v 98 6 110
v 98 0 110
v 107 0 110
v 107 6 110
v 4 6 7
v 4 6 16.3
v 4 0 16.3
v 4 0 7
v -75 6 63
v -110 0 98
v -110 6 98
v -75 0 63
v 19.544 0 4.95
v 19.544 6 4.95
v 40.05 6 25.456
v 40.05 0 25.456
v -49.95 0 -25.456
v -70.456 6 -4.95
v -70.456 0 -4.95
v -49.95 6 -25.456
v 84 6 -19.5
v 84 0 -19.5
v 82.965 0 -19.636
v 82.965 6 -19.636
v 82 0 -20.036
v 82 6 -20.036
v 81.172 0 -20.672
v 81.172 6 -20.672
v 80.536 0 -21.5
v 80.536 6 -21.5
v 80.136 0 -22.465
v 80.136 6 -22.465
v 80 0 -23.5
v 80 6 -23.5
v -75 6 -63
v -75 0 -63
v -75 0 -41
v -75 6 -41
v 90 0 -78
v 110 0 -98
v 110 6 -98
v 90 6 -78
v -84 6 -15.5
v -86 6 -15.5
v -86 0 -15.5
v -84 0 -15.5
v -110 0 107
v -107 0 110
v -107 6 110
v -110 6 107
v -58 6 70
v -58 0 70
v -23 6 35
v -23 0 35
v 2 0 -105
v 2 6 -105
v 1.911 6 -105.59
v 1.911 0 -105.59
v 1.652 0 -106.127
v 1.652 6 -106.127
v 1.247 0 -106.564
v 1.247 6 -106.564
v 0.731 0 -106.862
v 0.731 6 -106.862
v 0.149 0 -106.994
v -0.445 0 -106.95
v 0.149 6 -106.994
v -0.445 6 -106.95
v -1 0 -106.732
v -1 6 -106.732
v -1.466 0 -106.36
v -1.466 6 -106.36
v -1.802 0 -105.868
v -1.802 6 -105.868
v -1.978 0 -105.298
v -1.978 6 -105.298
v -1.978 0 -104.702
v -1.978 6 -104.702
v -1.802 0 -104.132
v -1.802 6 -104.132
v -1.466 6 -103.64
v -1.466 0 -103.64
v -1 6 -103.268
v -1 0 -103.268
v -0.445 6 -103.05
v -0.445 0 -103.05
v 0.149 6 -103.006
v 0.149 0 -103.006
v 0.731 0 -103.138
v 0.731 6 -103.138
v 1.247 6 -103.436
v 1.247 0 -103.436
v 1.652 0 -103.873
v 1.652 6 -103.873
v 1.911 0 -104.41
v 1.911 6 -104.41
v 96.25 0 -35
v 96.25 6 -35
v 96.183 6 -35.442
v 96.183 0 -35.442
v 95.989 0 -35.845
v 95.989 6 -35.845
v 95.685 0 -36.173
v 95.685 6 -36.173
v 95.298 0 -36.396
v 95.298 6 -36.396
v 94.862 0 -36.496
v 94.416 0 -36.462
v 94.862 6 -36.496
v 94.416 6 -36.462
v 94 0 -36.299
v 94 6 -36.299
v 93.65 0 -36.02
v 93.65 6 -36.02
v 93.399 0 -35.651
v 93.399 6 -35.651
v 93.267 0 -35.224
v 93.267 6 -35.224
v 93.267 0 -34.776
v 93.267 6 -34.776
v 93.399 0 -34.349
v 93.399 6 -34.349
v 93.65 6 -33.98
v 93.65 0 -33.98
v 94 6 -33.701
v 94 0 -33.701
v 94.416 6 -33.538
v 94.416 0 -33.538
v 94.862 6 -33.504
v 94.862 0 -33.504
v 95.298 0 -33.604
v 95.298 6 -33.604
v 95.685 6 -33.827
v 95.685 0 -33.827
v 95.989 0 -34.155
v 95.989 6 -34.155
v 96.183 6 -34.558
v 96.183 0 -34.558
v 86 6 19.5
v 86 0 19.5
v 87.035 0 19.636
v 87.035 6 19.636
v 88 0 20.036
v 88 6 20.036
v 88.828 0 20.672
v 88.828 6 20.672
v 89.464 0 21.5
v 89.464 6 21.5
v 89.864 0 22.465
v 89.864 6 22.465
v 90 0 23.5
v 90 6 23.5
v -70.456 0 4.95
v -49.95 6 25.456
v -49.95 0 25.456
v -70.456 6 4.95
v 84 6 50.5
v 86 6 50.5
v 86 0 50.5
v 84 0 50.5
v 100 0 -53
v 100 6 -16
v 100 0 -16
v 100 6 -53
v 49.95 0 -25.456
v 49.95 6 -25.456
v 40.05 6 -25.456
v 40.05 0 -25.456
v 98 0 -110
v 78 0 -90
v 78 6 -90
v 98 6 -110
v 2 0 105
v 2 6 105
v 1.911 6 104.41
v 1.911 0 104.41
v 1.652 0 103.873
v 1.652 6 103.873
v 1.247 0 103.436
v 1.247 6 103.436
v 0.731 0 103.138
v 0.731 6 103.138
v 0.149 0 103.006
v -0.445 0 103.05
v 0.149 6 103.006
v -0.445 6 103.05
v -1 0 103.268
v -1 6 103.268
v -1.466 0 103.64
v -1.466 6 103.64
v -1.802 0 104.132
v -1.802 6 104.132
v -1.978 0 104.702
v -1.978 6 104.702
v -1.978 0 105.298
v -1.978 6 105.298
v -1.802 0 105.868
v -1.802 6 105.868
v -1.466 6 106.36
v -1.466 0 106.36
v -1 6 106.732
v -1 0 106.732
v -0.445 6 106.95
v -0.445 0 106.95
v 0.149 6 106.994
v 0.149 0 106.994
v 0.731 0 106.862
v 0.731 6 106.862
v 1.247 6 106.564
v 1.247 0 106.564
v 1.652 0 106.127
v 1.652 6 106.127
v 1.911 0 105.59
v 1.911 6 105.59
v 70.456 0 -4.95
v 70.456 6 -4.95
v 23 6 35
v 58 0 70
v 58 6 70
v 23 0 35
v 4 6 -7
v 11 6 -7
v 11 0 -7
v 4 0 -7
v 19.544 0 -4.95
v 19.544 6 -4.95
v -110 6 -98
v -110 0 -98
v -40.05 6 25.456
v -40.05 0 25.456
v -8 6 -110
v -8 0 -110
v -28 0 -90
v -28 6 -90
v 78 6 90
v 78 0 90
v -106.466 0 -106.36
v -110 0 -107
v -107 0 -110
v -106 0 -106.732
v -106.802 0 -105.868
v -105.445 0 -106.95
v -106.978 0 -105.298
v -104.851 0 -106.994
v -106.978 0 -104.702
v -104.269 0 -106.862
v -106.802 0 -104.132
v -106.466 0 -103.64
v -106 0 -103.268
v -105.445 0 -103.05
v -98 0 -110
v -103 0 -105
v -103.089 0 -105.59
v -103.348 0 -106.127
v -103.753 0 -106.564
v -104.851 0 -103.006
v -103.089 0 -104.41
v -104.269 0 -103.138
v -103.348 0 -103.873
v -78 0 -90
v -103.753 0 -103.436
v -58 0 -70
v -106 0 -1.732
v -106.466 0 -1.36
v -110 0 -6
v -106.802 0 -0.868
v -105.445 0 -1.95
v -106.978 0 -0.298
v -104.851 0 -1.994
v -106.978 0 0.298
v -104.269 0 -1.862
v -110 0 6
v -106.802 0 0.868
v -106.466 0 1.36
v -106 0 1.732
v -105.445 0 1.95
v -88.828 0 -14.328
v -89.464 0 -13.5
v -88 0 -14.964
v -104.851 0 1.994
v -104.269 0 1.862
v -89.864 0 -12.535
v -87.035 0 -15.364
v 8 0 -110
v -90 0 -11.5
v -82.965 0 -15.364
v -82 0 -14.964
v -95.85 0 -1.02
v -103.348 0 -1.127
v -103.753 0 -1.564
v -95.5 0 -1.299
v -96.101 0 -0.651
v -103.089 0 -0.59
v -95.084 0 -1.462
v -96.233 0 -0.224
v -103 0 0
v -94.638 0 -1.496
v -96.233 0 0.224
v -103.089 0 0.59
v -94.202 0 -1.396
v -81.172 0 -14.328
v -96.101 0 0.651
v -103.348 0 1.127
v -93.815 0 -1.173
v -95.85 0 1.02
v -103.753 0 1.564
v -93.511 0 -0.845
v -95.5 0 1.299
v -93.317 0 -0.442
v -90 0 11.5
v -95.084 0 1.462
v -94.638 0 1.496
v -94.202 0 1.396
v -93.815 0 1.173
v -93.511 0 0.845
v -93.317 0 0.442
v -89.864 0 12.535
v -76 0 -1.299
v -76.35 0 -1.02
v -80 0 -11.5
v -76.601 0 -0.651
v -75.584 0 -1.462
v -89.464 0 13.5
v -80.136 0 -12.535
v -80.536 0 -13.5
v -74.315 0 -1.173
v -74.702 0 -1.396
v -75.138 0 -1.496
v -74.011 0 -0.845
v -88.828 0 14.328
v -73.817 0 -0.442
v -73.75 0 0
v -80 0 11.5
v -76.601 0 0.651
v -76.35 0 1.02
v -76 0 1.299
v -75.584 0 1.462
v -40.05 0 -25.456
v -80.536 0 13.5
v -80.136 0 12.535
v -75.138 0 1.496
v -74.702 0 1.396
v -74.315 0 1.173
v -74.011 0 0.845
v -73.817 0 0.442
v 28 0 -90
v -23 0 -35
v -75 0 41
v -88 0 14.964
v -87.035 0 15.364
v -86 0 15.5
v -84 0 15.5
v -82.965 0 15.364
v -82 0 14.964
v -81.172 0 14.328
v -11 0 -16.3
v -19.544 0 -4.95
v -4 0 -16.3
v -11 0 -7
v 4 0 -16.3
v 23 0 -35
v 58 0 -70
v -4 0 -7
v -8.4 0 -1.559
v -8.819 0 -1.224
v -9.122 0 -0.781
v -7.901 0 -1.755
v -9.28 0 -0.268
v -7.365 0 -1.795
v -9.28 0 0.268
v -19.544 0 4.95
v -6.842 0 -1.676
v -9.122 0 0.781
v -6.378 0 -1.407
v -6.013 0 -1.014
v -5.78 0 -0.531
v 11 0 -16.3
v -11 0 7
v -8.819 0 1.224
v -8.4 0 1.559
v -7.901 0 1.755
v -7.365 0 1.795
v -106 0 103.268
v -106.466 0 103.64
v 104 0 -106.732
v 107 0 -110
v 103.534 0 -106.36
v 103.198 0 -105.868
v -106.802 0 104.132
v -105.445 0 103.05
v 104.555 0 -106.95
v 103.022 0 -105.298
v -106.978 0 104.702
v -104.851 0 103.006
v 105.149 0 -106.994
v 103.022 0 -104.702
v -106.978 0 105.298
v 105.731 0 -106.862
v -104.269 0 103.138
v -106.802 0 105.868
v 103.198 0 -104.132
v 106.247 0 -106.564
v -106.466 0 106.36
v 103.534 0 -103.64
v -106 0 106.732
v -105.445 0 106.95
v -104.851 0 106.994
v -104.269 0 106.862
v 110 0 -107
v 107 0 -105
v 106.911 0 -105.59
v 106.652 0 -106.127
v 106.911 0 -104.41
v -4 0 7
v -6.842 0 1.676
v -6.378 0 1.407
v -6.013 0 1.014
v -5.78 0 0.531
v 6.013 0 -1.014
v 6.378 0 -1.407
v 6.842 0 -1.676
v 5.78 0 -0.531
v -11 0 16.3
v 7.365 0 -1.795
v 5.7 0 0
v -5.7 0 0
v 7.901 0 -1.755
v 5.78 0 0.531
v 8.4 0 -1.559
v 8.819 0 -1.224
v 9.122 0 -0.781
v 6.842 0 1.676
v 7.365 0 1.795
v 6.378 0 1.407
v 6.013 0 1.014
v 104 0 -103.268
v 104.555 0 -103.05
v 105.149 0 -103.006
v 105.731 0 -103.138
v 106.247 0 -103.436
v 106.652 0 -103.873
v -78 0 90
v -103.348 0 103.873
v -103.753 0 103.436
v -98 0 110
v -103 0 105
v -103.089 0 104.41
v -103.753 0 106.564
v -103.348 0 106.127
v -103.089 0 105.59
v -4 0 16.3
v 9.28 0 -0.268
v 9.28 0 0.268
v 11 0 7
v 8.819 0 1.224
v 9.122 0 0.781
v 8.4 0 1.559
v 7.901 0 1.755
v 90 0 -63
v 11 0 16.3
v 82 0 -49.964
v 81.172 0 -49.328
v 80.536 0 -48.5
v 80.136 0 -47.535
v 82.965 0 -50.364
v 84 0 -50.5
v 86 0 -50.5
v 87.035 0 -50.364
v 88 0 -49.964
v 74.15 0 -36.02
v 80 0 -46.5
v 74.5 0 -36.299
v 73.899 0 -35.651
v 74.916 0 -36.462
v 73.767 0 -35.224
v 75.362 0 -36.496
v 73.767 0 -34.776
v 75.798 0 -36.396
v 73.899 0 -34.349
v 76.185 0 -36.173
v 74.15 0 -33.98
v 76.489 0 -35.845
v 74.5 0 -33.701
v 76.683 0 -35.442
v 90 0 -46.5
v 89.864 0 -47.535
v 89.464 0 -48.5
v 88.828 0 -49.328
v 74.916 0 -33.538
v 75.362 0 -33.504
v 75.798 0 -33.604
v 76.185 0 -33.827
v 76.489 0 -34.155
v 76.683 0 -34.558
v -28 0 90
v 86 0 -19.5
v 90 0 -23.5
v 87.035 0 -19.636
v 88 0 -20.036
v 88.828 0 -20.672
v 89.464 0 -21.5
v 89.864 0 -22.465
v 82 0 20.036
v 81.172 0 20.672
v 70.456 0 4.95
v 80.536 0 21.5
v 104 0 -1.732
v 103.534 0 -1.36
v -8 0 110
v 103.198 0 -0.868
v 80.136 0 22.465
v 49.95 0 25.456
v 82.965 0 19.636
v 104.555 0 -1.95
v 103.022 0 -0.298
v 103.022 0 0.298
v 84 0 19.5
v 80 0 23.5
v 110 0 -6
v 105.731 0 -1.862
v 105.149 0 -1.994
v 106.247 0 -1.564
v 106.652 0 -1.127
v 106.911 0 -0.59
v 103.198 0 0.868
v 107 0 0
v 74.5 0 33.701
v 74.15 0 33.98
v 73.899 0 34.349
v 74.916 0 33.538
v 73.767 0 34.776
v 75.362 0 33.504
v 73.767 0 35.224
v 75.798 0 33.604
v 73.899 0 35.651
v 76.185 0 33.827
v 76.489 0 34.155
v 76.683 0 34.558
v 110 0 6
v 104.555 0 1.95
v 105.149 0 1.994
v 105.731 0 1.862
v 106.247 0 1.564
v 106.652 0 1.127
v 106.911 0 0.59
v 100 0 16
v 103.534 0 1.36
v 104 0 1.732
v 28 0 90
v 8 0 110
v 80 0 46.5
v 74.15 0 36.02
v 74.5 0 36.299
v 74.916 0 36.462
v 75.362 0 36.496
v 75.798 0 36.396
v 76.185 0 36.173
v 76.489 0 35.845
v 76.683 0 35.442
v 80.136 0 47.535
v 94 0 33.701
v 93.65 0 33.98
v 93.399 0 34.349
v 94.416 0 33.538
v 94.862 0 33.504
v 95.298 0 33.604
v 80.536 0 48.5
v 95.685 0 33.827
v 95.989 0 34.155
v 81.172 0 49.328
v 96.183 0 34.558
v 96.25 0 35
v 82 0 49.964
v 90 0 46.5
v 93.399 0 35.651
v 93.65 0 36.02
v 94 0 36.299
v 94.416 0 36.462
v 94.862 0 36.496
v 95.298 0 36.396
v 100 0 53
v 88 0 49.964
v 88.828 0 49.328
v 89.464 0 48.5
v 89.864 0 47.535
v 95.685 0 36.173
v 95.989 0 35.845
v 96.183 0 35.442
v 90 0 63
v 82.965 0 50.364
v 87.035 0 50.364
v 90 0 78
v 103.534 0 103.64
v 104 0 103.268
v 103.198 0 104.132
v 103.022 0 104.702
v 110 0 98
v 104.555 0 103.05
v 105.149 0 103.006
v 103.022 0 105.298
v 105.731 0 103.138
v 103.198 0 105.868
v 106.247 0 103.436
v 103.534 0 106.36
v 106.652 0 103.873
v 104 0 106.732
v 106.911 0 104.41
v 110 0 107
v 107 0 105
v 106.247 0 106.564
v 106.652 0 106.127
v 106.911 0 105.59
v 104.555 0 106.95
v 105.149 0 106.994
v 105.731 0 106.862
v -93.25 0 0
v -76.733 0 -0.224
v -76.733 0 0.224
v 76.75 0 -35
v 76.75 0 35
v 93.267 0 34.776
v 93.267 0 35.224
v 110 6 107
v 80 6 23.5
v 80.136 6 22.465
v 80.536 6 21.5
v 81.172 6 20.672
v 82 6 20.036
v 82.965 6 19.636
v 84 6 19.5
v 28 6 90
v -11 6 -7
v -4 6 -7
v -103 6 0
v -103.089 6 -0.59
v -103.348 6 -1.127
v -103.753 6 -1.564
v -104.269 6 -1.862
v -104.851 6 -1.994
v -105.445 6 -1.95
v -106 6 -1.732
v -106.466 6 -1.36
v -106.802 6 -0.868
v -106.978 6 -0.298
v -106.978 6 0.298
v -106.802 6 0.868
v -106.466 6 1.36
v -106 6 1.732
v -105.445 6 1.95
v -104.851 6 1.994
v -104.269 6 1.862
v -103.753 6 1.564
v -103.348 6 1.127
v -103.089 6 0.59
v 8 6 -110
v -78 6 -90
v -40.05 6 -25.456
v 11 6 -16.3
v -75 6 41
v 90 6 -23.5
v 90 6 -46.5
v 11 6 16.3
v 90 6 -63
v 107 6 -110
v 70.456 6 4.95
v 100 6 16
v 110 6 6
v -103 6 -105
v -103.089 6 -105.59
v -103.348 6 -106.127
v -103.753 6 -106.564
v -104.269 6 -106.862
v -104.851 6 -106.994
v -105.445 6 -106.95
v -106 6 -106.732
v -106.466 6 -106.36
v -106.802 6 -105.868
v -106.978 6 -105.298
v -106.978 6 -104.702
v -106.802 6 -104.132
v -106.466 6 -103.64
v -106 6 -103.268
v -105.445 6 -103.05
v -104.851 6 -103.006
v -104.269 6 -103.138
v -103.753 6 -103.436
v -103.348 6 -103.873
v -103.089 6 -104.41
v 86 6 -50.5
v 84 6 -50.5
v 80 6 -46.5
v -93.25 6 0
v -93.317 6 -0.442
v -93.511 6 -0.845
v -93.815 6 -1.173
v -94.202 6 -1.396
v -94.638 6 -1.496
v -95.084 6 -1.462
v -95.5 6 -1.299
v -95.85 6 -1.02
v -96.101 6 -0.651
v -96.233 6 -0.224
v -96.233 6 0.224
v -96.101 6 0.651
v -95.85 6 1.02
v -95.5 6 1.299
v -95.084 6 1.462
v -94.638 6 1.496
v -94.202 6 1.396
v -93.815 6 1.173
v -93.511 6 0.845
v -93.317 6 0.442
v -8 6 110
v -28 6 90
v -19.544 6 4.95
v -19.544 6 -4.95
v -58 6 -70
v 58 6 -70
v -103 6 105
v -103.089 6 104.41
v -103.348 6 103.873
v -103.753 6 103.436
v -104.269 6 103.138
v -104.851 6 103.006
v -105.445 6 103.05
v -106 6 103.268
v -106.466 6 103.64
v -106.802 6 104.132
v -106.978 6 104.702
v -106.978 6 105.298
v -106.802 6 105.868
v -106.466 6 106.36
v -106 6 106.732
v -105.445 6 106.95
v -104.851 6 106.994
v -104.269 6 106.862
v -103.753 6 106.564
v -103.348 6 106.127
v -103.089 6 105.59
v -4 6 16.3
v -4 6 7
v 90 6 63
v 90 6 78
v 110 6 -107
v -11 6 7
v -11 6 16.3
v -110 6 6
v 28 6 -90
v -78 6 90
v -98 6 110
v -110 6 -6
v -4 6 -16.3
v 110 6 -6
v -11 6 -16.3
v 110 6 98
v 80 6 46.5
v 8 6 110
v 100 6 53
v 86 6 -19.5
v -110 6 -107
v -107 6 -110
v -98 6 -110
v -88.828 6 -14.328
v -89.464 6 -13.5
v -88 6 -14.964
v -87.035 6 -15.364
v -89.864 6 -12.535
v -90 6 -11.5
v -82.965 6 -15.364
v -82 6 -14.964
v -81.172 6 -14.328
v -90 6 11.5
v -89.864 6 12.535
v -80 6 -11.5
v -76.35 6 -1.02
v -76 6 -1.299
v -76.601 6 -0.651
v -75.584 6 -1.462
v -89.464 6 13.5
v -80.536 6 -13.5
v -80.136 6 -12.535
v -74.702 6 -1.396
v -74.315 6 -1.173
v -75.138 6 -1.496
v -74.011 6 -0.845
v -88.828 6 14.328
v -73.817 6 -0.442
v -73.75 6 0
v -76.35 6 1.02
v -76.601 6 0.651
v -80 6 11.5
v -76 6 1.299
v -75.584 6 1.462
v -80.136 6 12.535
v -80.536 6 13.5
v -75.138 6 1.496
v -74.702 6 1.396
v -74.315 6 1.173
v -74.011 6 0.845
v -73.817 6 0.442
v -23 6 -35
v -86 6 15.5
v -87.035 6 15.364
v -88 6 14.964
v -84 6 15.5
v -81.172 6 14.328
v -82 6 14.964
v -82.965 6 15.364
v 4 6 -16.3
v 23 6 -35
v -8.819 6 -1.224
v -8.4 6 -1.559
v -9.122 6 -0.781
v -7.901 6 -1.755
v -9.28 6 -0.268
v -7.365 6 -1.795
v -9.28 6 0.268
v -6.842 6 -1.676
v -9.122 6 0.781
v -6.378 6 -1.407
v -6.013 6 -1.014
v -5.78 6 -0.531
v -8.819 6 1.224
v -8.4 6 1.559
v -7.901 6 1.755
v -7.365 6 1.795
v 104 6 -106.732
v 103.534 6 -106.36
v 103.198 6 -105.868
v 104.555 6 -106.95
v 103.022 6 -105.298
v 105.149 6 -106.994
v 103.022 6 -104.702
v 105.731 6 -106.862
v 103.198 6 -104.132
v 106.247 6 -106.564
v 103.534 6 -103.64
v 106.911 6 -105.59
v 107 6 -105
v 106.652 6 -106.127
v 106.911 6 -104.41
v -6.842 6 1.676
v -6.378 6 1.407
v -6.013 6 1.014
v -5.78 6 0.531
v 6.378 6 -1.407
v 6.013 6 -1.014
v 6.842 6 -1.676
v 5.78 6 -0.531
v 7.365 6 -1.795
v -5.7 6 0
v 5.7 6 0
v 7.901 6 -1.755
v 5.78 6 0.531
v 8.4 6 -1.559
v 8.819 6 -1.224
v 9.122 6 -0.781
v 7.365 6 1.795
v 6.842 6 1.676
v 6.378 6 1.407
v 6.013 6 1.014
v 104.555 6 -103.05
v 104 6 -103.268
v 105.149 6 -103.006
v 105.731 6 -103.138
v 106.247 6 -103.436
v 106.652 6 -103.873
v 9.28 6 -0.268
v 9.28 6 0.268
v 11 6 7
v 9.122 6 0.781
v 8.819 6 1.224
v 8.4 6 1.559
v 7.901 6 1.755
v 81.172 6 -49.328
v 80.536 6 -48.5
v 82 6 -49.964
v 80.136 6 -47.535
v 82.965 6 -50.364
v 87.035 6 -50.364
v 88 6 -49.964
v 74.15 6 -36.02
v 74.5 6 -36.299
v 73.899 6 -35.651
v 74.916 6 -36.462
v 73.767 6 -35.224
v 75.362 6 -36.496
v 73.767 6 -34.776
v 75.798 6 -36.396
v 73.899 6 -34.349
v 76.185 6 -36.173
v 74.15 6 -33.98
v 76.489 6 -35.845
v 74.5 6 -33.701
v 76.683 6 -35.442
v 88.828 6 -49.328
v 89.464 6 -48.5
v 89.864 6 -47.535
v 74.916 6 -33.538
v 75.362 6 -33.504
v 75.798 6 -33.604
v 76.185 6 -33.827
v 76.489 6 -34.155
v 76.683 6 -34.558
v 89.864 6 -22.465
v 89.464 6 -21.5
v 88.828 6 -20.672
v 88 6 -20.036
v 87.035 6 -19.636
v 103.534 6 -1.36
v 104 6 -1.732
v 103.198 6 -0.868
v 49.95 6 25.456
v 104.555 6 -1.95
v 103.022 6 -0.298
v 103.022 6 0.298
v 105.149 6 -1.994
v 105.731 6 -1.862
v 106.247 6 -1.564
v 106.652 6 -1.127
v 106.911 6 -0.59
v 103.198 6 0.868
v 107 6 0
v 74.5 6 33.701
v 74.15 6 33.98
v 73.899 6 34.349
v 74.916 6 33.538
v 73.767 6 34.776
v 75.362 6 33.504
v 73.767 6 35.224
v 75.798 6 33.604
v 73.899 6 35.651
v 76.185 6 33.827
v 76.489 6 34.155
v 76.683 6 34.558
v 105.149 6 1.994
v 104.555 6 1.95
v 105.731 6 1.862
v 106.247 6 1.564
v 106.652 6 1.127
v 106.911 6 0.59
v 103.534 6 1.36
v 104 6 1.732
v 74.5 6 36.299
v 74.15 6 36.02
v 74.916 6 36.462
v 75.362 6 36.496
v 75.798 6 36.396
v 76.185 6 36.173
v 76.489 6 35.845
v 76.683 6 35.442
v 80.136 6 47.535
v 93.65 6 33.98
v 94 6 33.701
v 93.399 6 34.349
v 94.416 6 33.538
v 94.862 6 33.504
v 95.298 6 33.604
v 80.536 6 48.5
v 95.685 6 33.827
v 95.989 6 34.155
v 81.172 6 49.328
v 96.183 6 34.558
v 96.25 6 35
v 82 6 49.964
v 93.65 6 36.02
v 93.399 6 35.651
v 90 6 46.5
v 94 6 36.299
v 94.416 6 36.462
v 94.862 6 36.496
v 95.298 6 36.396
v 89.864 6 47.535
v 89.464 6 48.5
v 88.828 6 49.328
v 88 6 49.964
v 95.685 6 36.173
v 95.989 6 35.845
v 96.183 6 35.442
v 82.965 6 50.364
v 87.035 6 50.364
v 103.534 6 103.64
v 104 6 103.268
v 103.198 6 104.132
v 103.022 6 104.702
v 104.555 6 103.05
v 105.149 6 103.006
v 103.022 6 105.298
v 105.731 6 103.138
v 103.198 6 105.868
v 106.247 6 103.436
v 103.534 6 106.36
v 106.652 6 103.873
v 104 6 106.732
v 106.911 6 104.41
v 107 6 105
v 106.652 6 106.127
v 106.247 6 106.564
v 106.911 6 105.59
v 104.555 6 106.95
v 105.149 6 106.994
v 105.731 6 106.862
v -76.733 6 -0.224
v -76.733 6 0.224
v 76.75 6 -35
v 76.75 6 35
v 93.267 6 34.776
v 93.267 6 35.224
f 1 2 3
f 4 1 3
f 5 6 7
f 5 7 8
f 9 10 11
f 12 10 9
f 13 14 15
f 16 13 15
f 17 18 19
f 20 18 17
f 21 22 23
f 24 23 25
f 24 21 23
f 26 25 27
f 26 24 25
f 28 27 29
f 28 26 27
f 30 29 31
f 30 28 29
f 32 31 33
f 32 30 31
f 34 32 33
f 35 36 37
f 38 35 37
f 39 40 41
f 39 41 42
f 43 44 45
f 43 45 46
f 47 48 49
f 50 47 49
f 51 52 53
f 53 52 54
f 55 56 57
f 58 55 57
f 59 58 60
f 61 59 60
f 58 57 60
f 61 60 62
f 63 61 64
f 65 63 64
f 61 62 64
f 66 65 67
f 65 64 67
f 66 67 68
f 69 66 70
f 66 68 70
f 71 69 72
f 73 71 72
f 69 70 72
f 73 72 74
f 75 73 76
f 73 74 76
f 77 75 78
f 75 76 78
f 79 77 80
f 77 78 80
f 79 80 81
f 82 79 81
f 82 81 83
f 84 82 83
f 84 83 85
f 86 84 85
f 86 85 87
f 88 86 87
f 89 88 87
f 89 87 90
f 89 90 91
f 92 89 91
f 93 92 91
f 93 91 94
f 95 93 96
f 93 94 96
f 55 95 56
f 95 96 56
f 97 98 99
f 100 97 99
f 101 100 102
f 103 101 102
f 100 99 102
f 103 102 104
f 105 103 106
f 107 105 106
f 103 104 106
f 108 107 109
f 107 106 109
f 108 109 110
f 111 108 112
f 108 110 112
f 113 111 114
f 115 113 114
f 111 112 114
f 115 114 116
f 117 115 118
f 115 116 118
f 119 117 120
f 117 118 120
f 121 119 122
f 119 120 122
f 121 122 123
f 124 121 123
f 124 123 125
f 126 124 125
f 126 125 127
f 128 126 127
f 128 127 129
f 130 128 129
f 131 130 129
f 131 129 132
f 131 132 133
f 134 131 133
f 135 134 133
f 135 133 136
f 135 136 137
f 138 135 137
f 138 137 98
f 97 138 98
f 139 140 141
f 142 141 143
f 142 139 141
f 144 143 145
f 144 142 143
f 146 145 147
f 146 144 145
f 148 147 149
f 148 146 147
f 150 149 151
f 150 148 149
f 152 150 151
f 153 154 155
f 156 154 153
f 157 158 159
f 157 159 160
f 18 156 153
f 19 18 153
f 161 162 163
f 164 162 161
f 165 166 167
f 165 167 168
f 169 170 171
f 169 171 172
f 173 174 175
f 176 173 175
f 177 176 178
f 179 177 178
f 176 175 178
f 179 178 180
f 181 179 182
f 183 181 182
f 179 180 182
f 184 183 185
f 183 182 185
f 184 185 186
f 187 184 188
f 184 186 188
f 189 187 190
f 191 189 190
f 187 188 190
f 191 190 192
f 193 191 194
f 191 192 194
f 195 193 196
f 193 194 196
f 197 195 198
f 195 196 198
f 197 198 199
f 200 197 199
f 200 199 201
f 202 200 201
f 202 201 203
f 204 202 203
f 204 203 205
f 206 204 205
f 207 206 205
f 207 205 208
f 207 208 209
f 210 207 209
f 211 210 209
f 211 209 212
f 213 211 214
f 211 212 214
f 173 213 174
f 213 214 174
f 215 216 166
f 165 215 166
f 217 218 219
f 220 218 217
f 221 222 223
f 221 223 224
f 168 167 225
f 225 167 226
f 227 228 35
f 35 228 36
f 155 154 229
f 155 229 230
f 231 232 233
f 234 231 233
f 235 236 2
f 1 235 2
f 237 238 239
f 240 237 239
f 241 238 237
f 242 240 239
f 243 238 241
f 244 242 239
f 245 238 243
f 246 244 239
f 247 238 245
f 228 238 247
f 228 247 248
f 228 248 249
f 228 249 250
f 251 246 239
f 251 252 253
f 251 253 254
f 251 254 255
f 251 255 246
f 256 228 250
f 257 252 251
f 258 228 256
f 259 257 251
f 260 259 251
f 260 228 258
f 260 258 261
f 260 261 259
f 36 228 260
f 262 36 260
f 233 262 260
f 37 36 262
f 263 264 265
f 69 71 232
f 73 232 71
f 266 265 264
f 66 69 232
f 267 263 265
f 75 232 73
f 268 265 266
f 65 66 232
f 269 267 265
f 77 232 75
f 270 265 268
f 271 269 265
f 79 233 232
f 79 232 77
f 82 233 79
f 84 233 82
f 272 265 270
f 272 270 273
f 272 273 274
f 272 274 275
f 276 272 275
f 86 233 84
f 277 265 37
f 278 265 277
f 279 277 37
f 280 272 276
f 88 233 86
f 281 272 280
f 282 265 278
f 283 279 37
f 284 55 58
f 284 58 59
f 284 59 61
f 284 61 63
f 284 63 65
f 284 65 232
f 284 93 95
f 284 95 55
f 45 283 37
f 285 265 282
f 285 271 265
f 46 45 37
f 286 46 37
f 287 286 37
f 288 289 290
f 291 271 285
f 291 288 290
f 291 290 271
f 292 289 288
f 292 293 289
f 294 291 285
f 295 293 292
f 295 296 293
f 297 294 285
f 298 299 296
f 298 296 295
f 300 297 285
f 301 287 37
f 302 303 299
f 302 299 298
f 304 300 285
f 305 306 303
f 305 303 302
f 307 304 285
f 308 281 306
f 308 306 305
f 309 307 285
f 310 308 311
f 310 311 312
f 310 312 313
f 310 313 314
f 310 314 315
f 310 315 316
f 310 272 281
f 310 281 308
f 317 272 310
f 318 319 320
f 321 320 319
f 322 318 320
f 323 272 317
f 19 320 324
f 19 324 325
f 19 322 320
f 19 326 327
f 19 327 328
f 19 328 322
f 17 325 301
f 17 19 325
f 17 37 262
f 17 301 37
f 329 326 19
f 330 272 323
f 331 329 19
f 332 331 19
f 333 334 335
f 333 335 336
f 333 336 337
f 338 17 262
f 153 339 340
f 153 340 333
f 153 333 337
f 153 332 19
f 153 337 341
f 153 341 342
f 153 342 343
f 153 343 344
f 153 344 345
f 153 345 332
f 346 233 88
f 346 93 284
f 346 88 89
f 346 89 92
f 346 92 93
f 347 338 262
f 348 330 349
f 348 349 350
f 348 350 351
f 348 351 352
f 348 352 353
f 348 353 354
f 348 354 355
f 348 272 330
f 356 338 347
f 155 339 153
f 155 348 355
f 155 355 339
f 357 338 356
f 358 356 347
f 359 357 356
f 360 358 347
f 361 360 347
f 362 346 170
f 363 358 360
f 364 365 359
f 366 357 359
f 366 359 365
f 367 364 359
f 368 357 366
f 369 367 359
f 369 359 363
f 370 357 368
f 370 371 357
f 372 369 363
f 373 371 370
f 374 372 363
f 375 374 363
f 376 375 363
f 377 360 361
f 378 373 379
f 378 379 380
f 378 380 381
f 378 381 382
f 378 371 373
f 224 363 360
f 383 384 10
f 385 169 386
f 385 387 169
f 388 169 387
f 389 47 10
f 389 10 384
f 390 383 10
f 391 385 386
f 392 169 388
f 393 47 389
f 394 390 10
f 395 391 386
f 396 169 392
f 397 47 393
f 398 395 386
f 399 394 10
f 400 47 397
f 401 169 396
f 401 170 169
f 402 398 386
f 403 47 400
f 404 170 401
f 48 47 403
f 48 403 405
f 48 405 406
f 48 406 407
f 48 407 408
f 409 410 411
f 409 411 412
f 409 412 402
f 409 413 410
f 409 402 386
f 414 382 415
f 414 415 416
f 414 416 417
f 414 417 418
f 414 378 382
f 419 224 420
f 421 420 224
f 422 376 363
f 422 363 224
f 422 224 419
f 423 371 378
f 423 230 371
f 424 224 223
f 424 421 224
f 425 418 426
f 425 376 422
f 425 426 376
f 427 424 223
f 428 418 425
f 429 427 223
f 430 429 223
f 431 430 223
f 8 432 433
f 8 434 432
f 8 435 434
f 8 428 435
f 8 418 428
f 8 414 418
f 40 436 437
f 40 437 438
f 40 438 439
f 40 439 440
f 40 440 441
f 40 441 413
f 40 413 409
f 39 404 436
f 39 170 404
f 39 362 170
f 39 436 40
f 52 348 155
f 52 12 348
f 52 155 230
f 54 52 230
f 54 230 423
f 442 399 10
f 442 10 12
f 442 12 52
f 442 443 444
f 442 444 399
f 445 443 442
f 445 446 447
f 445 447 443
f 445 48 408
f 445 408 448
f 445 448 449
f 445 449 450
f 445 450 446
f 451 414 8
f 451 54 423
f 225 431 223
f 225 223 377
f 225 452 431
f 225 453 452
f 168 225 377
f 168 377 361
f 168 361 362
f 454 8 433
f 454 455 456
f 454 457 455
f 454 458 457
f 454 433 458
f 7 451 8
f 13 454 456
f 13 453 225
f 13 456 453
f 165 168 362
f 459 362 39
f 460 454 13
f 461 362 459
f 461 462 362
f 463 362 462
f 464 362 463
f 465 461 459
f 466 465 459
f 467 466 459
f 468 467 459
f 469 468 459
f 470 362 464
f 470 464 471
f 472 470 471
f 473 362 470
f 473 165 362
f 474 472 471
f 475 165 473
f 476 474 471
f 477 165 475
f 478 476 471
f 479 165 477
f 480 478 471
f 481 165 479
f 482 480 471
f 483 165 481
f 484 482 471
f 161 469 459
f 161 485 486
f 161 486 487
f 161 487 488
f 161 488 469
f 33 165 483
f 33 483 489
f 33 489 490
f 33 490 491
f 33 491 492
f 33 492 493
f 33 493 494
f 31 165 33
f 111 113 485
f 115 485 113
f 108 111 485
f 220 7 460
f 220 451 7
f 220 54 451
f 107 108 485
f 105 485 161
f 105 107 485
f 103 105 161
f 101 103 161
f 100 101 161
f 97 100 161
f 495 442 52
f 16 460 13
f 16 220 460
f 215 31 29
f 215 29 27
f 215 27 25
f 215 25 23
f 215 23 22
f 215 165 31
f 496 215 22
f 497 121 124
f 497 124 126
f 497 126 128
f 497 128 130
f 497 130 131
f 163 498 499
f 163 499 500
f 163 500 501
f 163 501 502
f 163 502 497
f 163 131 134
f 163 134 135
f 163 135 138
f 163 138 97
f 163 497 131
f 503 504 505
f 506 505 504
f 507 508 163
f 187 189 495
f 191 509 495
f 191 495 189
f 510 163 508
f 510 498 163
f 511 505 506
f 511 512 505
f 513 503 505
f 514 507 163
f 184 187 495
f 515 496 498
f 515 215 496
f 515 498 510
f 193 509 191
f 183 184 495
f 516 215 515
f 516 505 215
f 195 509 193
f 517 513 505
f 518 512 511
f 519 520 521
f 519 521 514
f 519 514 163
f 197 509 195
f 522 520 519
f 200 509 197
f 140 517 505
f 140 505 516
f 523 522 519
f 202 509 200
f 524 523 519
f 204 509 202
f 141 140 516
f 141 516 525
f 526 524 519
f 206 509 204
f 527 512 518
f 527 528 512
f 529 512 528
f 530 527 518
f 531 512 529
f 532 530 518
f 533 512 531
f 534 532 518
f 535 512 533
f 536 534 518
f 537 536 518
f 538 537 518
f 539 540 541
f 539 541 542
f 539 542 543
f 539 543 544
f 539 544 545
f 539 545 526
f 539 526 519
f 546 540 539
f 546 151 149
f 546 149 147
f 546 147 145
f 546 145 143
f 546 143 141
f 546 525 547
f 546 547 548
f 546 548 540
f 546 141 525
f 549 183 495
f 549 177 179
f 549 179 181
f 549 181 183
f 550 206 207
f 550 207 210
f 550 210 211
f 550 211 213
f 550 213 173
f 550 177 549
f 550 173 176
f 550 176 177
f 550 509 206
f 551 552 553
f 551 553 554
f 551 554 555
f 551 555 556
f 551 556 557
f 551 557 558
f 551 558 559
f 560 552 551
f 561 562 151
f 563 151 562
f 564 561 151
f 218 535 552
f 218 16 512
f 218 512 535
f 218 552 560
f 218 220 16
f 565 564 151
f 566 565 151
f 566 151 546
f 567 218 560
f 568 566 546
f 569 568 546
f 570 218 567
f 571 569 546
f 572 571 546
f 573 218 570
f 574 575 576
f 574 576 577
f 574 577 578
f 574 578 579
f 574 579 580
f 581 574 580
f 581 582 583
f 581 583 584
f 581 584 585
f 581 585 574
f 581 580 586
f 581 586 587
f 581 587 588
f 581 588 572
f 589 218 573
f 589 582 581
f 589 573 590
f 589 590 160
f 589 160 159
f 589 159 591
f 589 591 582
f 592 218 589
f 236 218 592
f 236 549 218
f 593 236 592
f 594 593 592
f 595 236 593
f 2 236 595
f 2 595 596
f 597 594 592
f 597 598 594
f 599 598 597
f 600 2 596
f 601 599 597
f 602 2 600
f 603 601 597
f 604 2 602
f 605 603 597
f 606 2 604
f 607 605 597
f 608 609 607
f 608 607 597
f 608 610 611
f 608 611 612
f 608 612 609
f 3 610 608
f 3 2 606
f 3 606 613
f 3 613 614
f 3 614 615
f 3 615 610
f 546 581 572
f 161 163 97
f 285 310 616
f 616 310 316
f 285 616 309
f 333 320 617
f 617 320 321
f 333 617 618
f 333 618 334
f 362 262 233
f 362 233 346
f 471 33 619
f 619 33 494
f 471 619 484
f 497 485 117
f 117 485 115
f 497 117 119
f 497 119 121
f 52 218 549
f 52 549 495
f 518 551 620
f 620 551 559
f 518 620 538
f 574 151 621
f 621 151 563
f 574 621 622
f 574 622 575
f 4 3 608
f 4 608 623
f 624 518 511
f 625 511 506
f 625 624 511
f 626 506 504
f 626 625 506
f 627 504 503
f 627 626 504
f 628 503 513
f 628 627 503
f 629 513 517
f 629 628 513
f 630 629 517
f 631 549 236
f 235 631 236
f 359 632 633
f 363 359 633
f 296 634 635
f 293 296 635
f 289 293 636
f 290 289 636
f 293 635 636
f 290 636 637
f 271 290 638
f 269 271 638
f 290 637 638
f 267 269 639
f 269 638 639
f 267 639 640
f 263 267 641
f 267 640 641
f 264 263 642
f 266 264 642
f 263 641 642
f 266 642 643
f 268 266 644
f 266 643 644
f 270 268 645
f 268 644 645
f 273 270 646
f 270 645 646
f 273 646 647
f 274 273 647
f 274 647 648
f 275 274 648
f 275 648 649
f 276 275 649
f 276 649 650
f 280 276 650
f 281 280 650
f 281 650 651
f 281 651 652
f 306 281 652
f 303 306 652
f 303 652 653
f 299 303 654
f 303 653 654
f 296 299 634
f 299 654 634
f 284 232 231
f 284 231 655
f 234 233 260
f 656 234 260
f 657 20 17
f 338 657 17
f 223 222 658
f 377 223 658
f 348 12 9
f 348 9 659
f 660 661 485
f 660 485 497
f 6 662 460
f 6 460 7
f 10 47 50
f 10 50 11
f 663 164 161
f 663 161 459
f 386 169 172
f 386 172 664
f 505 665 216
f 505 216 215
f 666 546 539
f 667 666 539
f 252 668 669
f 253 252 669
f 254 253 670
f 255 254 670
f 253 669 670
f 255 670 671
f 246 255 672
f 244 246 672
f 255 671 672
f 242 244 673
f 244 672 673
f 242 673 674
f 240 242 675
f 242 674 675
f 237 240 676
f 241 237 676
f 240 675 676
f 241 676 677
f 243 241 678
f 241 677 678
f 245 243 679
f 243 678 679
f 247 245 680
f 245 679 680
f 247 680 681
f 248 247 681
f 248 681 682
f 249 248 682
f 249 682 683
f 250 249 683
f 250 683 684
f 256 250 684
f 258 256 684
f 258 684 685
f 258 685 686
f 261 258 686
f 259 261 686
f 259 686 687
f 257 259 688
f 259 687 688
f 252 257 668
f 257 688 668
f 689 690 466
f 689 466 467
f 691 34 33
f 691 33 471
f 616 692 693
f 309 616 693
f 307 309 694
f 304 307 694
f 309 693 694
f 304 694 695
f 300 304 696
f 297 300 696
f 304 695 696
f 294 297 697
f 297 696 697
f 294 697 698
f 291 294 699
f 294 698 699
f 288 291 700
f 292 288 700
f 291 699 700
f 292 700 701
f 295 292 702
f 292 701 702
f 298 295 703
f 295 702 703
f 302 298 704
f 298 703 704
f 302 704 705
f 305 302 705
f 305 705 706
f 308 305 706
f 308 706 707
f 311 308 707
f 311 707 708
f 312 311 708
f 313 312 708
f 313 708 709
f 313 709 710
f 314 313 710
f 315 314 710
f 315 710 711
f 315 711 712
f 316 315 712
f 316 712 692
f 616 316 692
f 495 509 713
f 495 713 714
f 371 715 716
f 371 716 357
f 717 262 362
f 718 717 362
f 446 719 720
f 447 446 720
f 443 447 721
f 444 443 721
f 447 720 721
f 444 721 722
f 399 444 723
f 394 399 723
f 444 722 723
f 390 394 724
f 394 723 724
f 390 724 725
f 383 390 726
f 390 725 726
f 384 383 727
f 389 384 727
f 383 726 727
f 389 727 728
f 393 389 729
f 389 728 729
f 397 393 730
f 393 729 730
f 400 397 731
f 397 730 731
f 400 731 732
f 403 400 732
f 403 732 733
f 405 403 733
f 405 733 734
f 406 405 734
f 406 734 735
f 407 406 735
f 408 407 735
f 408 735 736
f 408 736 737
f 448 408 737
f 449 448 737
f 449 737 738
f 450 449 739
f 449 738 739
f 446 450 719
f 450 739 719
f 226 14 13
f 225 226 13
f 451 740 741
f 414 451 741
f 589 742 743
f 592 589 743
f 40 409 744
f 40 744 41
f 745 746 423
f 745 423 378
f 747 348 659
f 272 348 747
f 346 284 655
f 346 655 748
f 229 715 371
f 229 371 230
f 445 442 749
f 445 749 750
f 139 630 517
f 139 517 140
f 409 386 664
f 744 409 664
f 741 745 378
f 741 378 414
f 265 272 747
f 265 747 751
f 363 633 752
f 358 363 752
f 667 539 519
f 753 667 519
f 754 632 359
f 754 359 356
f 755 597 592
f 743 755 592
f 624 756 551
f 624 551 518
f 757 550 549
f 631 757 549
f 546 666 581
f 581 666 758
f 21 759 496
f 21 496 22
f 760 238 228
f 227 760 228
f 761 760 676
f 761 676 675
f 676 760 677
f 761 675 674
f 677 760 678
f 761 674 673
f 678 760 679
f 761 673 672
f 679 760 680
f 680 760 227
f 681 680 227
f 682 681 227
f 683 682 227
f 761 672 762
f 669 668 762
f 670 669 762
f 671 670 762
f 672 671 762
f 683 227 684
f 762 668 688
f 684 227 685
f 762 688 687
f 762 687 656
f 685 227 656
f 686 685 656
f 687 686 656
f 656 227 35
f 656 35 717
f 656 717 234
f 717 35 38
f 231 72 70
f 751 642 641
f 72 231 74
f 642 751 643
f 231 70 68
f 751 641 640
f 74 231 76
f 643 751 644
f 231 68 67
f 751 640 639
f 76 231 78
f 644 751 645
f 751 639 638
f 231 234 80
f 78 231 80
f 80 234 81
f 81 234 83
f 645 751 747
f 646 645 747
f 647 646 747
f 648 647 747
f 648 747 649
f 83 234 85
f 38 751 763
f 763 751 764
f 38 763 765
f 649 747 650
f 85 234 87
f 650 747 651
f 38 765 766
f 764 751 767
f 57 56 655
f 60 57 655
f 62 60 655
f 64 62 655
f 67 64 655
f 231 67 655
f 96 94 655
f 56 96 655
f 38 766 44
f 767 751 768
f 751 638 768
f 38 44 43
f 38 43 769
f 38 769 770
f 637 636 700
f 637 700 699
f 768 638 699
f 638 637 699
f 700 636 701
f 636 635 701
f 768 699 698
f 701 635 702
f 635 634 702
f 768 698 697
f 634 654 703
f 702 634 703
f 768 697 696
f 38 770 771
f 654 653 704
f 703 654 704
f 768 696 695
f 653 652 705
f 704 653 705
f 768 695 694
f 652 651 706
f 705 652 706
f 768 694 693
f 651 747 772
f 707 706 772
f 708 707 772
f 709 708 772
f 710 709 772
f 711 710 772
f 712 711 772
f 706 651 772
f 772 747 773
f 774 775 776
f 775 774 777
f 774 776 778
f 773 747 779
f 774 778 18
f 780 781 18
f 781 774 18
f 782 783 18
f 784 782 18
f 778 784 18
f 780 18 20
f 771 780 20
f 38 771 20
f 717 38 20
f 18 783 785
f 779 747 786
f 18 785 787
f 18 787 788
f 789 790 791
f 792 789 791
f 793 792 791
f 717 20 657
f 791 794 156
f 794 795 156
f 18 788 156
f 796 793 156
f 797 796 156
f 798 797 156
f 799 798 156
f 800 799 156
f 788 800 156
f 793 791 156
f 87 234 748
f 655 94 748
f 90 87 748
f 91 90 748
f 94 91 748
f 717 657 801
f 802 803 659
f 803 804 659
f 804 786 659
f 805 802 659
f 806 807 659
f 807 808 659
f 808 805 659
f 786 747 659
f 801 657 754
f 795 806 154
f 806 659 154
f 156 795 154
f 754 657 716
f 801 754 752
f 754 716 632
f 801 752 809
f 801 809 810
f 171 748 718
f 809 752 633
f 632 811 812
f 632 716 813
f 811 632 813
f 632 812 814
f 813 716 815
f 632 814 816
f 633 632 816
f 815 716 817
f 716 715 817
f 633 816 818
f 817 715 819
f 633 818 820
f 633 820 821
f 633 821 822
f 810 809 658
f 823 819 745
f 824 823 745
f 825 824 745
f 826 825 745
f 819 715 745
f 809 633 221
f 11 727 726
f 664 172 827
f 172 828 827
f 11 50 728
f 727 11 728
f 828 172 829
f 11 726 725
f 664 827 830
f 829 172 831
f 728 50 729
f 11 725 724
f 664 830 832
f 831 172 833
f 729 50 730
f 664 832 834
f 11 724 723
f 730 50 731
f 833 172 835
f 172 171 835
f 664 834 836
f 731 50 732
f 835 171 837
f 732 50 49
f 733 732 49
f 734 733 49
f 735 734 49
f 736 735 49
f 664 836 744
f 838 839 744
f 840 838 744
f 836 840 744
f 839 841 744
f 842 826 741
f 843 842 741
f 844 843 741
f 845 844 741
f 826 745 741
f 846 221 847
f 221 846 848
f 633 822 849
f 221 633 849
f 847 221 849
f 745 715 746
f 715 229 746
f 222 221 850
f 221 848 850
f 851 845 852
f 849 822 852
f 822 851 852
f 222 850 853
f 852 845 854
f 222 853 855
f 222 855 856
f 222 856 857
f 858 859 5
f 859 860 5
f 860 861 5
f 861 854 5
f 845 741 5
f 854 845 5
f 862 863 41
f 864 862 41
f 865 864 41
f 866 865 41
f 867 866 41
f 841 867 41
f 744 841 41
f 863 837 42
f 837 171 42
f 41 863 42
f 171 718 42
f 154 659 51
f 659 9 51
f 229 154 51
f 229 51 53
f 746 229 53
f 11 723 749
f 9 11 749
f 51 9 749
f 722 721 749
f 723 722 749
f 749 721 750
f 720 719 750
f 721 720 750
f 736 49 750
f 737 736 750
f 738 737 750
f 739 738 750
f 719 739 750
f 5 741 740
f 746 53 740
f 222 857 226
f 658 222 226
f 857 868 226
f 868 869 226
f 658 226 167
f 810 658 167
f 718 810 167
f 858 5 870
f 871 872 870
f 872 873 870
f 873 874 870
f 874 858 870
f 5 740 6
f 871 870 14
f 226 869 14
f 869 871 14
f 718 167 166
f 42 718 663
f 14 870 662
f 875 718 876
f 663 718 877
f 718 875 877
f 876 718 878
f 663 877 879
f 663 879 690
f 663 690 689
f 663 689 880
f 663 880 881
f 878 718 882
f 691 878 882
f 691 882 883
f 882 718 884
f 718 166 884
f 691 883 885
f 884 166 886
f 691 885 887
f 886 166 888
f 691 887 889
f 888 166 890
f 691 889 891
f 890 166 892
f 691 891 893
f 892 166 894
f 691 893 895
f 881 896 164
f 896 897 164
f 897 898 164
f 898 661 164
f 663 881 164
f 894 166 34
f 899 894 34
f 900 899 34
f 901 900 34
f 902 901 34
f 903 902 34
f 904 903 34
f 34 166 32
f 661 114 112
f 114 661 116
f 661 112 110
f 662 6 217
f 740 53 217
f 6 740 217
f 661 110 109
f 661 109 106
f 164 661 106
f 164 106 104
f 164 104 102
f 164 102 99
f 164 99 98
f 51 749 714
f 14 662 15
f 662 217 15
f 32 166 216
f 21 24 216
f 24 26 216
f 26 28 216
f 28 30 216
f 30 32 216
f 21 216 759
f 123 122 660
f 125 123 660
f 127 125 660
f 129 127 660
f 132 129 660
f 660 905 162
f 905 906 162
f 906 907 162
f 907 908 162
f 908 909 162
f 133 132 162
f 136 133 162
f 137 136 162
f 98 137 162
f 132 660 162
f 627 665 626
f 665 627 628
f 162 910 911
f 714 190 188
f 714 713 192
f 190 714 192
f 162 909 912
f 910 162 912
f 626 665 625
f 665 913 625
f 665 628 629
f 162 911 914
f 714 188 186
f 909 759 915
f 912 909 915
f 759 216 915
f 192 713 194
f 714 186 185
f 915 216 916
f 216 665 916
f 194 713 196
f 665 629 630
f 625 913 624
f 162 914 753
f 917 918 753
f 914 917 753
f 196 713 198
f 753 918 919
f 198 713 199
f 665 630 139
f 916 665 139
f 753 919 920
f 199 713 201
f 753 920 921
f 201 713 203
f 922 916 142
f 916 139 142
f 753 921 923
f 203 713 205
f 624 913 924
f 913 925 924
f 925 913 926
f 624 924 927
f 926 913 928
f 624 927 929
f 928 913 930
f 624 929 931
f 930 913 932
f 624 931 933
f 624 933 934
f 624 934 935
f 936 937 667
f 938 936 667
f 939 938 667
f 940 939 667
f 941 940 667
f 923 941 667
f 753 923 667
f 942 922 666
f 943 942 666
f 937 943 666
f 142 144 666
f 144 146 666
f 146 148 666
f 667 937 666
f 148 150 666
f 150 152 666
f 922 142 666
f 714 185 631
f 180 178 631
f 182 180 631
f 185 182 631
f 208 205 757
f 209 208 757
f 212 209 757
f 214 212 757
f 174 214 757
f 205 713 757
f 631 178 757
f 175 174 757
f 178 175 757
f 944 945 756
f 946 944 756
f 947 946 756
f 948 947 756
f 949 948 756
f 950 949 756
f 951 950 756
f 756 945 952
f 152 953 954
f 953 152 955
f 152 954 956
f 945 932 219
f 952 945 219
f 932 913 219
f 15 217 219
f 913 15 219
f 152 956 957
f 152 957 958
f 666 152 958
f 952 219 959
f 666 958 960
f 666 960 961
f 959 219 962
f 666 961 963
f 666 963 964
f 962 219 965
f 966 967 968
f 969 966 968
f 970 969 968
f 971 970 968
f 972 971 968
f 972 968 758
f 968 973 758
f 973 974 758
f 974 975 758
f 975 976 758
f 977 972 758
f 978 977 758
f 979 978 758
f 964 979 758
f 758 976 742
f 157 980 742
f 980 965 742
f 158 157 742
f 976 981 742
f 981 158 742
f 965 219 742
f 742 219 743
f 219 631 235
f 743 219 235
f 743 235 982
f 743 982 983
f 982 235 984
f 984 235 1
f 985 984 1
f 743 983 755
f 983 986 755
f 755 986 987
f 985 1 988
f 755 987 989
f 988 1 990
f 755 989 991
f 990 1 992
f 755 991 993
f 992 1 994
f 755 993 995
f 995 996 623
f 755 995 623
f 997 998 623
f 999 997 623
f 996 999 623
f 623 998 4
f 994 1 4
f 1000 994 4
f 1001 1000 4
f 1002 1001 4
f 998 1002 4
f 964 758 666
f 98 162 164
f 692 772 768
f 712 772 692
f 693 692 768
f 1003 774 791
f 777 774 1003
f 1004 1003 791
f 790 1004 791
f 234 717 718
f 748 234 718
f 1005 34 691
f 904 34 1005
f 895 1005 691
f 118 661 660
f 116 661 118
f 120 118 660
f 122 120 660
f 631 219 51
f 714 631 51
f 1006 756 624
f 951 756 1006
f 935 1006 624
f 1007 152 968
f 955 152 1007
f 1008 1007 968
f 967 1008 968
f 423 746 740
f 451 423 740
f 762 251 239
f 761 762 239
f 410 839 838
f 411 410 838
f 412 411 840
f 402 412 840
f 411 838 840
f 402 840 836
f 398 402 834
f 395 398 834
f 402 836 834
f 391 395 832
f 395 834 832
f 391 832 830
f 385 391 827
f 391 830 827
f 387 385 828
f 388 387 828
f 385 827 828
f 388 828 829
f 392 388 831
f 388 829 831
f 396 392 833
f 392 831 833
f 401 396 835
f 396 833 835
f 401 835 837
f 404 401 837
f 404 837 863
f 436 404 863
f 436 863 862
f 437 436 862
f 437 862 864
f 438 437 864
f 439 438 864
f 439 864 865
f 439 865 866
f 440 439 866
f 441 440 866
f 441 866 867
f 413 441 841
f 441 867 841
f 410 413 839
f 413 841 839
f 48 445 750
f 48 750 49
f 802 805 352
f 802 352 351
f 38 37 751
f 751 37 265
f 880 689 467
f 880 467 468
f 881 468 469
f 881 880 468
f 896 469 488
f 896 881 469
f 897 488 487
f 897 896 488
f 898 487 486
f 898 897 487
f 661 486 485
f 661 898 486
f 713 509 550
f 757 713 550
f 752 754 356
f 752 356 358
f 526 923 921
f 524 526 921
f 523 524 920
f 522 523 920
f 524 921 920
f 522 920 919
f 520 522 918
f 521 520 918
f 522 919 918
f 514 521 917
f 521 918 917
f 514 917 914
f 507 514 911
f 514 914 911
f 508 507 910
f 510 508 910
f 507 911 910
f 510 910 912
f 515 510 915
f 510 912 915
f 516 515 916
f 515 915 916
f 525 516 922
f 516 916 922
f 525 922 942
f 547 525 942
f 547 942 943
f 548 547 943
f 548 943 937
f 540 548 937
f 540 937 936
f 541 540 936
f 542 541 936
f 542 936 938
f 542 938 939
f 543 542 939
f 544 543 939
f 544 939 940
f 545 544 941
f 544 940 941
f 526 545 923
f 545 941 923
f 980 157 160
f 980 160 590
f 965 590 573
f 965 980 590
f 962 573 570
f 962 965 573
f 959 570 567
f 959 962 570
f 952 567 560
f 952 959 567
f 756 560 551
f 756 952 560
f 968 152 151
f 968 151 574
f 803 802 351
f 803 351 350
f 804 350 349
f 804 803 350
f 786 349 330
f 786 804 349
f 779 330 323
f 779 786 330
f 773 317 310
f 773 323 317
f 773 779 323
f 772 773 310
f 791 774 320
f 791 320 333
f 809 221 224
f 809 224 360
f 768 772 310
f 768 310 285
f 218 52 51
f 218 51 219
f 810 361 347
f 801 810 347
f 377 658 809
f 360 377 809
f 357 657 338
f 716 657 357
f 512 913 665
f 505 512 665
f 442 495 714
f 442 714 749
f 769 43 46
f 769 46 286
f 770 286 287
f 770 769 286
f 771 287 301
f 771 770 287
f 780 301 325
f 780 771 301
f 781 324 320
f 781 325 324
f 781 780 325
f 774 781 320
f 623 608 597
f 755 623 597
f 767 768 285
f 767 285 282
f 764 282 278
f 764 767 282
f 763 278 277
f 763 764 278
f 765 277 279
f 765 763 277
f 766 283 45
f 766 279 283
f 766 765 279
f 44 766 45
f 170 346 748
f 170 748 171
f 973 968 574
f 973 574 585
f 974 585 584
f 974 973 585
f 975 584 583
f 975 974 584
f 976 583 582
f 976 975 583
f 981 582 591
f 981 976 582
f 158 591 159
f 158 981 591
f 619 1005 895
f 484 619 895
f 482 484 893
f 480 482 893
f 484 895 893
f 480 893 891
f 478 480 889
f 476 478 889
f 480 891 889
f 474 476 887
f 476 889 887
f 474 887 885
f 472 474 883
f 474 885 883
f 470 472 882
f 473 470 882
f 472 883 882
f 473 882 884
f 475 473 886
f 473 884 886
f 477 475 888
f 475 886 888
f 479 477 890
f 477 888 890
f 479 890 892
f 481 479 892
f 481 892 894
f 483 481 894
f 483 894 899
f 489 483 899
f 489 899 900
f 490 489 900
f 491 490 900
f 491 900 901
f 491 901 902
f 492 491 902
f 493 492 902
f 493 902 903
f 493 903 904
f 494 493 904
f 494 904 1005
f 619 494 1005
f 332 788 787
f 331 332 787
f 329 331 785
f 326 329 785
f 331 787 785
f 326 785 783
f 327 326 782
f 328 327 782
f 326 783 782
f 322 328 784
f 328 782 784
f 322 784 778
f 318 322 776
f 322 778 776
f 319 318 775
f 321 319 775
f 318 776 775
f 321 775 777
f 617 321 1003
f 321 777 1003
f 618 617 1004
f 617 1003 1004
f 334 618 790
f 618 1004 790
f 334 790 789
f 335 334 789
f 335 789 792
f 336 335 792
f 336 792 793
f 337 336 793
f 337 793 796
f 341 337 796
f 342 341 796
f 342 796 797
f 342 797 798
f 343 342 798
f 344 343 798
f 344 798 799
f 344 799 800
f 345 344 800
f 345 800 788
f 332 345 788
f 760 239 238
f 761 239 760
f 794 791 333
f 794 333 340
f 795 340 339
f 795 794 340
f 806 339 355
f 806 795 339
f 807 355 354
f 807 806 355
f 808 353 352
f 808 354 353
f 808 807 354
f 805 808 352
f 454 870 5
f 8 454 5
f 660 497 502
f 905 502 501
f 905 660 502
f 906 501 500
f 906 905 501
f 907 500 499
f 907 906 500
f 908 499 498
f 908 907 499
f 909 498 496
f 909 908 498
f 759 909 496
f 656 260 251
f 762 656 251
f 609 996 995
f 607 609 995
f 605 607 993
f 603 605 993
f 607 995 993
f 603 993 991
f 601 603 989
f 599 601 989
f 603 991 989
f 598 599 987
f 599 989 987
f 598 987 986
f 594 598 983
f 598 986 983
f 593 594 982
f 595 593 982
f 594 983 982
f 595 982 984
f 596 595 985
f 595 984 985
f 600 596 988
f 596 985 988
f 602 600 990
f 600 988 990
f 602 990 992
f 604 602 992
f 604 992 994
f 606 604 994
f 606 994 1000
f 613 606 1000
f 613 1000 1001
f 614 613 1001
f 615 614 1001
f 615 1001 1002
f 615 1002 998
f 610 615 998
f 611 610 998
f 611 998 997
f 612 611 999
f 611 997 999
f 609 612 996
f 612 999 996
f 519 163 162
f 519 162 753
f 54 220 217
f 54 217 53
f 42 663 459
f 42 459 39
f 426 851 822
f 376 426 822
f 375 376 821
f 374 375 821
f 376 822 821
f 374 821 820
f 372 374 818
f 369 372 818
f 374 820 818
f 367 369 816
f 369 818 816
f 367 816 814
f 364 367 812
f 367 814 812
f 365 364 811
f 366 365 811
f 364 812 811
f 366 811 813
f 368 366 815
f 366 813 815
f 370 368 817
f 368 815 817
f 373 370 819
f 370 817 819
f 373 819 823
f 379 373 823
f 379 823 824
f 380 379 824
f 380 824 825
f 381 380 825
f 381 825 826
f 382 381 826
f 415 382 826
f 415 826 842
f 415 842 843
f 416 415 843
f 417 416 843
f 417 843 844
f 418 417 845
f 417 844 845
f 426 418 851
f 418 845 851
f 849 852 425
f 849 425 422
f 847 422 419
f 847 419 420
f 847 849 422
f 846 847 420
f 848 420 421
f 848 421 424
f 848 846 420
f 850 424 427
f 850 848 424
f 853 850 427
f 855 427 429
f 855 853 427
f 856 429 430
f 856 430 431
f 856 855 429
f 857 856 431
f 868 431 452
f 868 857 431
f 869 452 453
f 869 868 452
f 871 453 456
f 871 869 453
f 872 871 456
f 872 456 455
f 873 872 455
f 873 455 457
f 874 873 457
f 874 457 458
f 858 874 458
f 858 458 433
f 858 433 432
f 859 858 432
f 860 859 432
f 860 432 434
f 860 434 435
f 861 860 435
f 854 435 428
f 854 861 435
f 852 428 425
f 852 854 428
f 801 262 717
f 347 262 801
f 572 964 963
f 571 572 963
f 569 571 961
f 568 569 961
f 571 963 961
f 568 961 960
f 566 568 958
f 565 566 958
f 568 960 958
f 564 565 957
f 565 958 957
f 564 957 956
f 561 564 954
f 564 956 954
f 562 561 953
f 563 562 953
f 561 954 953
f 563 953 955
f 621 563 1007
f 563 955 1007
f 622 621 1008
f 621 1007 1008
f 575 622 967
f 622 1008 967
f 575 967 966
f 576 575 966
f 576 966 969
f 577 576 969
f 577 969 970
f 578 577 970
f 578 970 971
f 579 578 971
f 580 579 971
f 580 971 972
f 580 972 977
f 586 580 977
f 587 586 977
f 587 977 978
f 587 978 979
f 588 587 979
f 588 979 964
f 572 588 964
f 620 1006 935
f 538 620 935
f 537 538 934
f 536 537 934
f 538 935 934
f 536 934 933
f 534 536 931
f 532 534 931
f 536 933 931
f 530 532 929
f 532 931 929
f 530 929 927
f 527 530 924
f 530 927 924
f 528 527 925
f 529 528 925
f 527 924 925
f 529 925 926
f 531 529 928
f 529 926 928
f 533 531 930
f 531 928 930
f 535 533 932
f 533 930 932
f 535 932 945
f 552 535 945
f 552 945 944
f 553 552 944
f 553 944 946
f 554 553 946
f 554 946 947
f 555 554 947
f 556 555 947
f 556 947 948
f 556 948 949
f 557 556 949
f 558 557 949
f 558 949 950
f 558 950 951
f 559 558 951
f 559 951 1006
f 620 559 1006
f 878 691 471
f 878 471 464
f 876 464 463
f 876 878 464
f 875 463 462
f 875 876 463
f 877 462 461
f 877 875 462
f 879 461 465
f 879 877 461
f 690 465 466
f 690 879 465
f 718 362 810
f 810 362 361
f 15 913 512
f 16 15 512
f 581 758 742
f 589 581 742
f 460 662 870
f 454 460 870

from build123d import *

# Parameters (mm, degrees)
BOSS_EXTRU_1_DEPTH      = 6
ENL_V_MAT_EXTRU_2_DEPTH = 6
CHANFREIN1_SIZE         = 3
ESQUISSE4_R             = 1.8
ESQUISSE4_W             = 7
ESQUISSE4_H             = 9.3
ENL_V_MAT_EXTRU_3_DEPTH = 6
CHANFREIN2_SIZE         = 7
BOSS_EXTRU_2_DEPTH      = 6
ESQUISSE11_R            = 2
ENL_V_MAT_EXTRU_6_DEPTH = 6
ESQUISSE12_R            = 1.5
ENL_V_MAT_EXTRU_7_DEPTH = 10


with BuildPart() as part:
    # Esquisse1 → Boss.-Extru.1 (new body)
    with BuildSketch(Plane(origin=(0, 0, 0), x_dir=(1, 0, 0), z_dir=(0, 1, 0))):
        Polygon((0, 0), (0, 110), (-8, 110), (-28, 90), (-78, 90), (-98, 110), (-110, 110), (-110, 98), (-75, 63), (-75, 41), (-110, 6), (-110, 0), align=None)
    extrude(amount=BOSS_EXTRU_1_DEPTH)

    # Esquisse3 → Enlèv. mat.-Extru.2 (cut)
    with BuildSketch(Plane(origin=(0, 0, 0), x_dir=(1, 0, 0), z_dir=(0, 1, 0))):
        Polygon((0, 70), (-58, 70), (-23, 35), (0, 35), align=None)
    extrude(amount=ENL_V_MAT_EXTRU_2_DEPTH, mode=Mode.SUBTRACT)

    # Chanfrein1
    chanfrein1_edges = [part.edges().sort_by_distance(p)[0] for p in [
        (-110, 3, -110),
    ]]
    chamfer(chanfrein1_edges, length=CHANFREIN1_SIZE)

    # Symétrie3: part across plane


with BuildPart() as part_1:
    add(part.part)
    add(part.part.mirror(Plane(origin=(-110, 6, 0), x_dir=(1, 0, 0), z_dir=(0, 0, -1))))

    # Esquisse4 → Enlèv. mat.-Extru.3 (cut)
    with BuildSketch(Plane(origin=(0, 6, 0), x_dir=(1, 0, 0), z_dir=(0, 1, 0))):
        with Locations((-7.5, 0)):
            Circle(ESQUISSE4_R)
        Polygon((-45, 30.405591591), (-14.594408409, 0), (-45, -30.405591591), (-75.405591591, 0), align=None)
        with Locations((-7.5, 11.65)):
            Rectangle(ESQUISSE4_W, ESQUISSE4_H)
        with Locations((-7.5, -11.65)):
            Rectangle(ESQUISSE4_W, ESQUISSE4_H)
    extrude(amount=-ENL_V_MAT_EXTRU_3_DEPTH, mode=Mode.SUBTRACT)

    # Chanfrein2
    chanfrein2_edges = [part_1.edges().sort_by_distance(p)[0] for p in [
        (-14.594408409, 3, 0),
        (-45, 3, 30.405591591),
        (-75.405591591, 3, 0),
        (-45, 3, -30.405591591),
    ]]
    chamfer(chanfrein2_edges, length=CHANFREIN2_SIZE)

    # Symétrie5: part across plane


with BuildPart() as part_2:
    add(part_1.part)
    add(part_1.part.mirror(Plane(origin=(0, 6, 0), x_dir=(0, 0, 1), z_dir=(-1, 0, 0))))

    # Esquisse8 → Boss.-Extru.2 (add)
    with BuildSketch(Plane(origin=(0, 6, 0), x_dir=(1, 0, 0), z_dir=(0, 1, 0))):
        Polygon((100, 16), (100, 53), (90, 63), (90, 78), (75, 63), (75, 41), align=None)
    boss_extru_2 = extrude(amount=-BOSS_EXTRU_2_DEPTH)

    # Esquisse11 → Enlèv. mat.-Extru.6 (cut)
    with BuildSketch(Plane(origin=(0, 6, 0), x_dir=(1, 0, 0), z_dir=(0, 1, 0))):
        with Locations((-105, 105)):
            Circle(ESQUISSE11_R)
        with Locations((0, 105)):
            Circle(ESQUISSE11_R)
        with Locations((105, 105)):
            Circle(ESQUISSE11_R)
        with Locations((105, 0)):
            Circle(ESQUISSE11_R)
        with Locations((105, -105)):
            Circle(ESQUISSE11_R)
        with Locations((0, -105)):
            Circle(ESQUISSE11_R)
        with Locations((-105, -105)):
            Circle(ESQUISSE11_R)
        with Locations((-105, 0)):
            Circle(ESQUISSE11_R)
    extrude(amount=-ENL_V_MAT_EXTRU_6_DEPTH, mode=Mode.SUBTRACT)

    # Symétrie6: Boss.-Extru.2 across plane
    add(boss_extru_2.mirror(Plane.XY))

    # Esquisse12 → Enlèv. mat.-Extru.7 (cut)
    with BuildSketch(Plane(origin=(0, 6, 0), x_dir=(1, 0, 0), z_dir=(0, 1, 0))):
        with Locations((-94.75, 0)):
            Circle(ESQUISSE12_R)
        with Locations((-75.25, 0)):
            Circle(ESQUISSE12_R)
        with Locations((75.25, 35)):
            Circle(ESQUISSE12_R)
        with Locations((94.75, 35)):
            Circle(ESQUISSE12_R)
        with Locations((75.25, -35)):
            Circle(ESQUISSE12_R)
        with Locations((94.75, -35)):
            Circle(ESQUISSE12_R)
        with BuildLine():
            Line((-86, 15.5), (-84, 15.5))
            ThreePointArc((-84, 15.5), (-81.171572875, 14.328427125), (-80, 11.5))
            Line((-80, 11.5), (-80, -11.5))
            ThreePointArc((-80, -11.5), (-81.171572875, -14.328427125), (-84, -15.5))
            Line((-84, -15.5), (-86, -15.5))
            ThreePointArc((-86, -15.5), (-88.828427125, -14.328427125), (-90, -11.5))
            Line((-90, -11.5), (-90, 11.5))
            ThreePointArc((-90, 11.5), (-88.828427125, 14.328427125), (-86, 15.5))
        make_face()
        with BuildLine():
            Line((84, 50.5), (86, 50.5))
            ThreePointArc((86, 50.5), (88.828427125, 49.328427125), (90, 46.5))
            Line((90, 46.5), (90, 23.5))
            ThreePointArc((90, 23.5), (88.828427125, 20.671572875), (86, 19.5))
            Line((86, 19.5), (84, 19.5))
            ThreePointArc((84, 19.5), (81.171572875, 20.671572875), (80, 23.5))
            Line((80, 23.5), (80, 46.5))
            ThreePointArc((80, 46.5), (81.171572875, 49.328427125), (84, 50.5))
        make_face()
        with BuildLine():
            Line((84, -19.5), (86, -19.5))
            ThreePointArc((86, -19.5), (88.828427125, -20.671572875), (90, -23.5))
            Line((90, -23.5), (90, -46.5))
            ThreePointArc((90, -46.5), (88.828427125, -49.328427125), (86, -50.5))
            Line((86, -50.5), (84, -50.5))
            ThreePointArc((84, -50.5), (81.171572875, -49.328427125), (80, -46.5))
            Line((80, -46.5), (80, -23.5))
            ThreePointArc((80, -23.5), (81.171572875, -20.671572875), (84, -19.5))
        make_face()
    extrude(amount=-ENL_V_MAT_EXTRU_7_DEPTH, mode=Mode.SUBTRACT)


solid = part_2.part
